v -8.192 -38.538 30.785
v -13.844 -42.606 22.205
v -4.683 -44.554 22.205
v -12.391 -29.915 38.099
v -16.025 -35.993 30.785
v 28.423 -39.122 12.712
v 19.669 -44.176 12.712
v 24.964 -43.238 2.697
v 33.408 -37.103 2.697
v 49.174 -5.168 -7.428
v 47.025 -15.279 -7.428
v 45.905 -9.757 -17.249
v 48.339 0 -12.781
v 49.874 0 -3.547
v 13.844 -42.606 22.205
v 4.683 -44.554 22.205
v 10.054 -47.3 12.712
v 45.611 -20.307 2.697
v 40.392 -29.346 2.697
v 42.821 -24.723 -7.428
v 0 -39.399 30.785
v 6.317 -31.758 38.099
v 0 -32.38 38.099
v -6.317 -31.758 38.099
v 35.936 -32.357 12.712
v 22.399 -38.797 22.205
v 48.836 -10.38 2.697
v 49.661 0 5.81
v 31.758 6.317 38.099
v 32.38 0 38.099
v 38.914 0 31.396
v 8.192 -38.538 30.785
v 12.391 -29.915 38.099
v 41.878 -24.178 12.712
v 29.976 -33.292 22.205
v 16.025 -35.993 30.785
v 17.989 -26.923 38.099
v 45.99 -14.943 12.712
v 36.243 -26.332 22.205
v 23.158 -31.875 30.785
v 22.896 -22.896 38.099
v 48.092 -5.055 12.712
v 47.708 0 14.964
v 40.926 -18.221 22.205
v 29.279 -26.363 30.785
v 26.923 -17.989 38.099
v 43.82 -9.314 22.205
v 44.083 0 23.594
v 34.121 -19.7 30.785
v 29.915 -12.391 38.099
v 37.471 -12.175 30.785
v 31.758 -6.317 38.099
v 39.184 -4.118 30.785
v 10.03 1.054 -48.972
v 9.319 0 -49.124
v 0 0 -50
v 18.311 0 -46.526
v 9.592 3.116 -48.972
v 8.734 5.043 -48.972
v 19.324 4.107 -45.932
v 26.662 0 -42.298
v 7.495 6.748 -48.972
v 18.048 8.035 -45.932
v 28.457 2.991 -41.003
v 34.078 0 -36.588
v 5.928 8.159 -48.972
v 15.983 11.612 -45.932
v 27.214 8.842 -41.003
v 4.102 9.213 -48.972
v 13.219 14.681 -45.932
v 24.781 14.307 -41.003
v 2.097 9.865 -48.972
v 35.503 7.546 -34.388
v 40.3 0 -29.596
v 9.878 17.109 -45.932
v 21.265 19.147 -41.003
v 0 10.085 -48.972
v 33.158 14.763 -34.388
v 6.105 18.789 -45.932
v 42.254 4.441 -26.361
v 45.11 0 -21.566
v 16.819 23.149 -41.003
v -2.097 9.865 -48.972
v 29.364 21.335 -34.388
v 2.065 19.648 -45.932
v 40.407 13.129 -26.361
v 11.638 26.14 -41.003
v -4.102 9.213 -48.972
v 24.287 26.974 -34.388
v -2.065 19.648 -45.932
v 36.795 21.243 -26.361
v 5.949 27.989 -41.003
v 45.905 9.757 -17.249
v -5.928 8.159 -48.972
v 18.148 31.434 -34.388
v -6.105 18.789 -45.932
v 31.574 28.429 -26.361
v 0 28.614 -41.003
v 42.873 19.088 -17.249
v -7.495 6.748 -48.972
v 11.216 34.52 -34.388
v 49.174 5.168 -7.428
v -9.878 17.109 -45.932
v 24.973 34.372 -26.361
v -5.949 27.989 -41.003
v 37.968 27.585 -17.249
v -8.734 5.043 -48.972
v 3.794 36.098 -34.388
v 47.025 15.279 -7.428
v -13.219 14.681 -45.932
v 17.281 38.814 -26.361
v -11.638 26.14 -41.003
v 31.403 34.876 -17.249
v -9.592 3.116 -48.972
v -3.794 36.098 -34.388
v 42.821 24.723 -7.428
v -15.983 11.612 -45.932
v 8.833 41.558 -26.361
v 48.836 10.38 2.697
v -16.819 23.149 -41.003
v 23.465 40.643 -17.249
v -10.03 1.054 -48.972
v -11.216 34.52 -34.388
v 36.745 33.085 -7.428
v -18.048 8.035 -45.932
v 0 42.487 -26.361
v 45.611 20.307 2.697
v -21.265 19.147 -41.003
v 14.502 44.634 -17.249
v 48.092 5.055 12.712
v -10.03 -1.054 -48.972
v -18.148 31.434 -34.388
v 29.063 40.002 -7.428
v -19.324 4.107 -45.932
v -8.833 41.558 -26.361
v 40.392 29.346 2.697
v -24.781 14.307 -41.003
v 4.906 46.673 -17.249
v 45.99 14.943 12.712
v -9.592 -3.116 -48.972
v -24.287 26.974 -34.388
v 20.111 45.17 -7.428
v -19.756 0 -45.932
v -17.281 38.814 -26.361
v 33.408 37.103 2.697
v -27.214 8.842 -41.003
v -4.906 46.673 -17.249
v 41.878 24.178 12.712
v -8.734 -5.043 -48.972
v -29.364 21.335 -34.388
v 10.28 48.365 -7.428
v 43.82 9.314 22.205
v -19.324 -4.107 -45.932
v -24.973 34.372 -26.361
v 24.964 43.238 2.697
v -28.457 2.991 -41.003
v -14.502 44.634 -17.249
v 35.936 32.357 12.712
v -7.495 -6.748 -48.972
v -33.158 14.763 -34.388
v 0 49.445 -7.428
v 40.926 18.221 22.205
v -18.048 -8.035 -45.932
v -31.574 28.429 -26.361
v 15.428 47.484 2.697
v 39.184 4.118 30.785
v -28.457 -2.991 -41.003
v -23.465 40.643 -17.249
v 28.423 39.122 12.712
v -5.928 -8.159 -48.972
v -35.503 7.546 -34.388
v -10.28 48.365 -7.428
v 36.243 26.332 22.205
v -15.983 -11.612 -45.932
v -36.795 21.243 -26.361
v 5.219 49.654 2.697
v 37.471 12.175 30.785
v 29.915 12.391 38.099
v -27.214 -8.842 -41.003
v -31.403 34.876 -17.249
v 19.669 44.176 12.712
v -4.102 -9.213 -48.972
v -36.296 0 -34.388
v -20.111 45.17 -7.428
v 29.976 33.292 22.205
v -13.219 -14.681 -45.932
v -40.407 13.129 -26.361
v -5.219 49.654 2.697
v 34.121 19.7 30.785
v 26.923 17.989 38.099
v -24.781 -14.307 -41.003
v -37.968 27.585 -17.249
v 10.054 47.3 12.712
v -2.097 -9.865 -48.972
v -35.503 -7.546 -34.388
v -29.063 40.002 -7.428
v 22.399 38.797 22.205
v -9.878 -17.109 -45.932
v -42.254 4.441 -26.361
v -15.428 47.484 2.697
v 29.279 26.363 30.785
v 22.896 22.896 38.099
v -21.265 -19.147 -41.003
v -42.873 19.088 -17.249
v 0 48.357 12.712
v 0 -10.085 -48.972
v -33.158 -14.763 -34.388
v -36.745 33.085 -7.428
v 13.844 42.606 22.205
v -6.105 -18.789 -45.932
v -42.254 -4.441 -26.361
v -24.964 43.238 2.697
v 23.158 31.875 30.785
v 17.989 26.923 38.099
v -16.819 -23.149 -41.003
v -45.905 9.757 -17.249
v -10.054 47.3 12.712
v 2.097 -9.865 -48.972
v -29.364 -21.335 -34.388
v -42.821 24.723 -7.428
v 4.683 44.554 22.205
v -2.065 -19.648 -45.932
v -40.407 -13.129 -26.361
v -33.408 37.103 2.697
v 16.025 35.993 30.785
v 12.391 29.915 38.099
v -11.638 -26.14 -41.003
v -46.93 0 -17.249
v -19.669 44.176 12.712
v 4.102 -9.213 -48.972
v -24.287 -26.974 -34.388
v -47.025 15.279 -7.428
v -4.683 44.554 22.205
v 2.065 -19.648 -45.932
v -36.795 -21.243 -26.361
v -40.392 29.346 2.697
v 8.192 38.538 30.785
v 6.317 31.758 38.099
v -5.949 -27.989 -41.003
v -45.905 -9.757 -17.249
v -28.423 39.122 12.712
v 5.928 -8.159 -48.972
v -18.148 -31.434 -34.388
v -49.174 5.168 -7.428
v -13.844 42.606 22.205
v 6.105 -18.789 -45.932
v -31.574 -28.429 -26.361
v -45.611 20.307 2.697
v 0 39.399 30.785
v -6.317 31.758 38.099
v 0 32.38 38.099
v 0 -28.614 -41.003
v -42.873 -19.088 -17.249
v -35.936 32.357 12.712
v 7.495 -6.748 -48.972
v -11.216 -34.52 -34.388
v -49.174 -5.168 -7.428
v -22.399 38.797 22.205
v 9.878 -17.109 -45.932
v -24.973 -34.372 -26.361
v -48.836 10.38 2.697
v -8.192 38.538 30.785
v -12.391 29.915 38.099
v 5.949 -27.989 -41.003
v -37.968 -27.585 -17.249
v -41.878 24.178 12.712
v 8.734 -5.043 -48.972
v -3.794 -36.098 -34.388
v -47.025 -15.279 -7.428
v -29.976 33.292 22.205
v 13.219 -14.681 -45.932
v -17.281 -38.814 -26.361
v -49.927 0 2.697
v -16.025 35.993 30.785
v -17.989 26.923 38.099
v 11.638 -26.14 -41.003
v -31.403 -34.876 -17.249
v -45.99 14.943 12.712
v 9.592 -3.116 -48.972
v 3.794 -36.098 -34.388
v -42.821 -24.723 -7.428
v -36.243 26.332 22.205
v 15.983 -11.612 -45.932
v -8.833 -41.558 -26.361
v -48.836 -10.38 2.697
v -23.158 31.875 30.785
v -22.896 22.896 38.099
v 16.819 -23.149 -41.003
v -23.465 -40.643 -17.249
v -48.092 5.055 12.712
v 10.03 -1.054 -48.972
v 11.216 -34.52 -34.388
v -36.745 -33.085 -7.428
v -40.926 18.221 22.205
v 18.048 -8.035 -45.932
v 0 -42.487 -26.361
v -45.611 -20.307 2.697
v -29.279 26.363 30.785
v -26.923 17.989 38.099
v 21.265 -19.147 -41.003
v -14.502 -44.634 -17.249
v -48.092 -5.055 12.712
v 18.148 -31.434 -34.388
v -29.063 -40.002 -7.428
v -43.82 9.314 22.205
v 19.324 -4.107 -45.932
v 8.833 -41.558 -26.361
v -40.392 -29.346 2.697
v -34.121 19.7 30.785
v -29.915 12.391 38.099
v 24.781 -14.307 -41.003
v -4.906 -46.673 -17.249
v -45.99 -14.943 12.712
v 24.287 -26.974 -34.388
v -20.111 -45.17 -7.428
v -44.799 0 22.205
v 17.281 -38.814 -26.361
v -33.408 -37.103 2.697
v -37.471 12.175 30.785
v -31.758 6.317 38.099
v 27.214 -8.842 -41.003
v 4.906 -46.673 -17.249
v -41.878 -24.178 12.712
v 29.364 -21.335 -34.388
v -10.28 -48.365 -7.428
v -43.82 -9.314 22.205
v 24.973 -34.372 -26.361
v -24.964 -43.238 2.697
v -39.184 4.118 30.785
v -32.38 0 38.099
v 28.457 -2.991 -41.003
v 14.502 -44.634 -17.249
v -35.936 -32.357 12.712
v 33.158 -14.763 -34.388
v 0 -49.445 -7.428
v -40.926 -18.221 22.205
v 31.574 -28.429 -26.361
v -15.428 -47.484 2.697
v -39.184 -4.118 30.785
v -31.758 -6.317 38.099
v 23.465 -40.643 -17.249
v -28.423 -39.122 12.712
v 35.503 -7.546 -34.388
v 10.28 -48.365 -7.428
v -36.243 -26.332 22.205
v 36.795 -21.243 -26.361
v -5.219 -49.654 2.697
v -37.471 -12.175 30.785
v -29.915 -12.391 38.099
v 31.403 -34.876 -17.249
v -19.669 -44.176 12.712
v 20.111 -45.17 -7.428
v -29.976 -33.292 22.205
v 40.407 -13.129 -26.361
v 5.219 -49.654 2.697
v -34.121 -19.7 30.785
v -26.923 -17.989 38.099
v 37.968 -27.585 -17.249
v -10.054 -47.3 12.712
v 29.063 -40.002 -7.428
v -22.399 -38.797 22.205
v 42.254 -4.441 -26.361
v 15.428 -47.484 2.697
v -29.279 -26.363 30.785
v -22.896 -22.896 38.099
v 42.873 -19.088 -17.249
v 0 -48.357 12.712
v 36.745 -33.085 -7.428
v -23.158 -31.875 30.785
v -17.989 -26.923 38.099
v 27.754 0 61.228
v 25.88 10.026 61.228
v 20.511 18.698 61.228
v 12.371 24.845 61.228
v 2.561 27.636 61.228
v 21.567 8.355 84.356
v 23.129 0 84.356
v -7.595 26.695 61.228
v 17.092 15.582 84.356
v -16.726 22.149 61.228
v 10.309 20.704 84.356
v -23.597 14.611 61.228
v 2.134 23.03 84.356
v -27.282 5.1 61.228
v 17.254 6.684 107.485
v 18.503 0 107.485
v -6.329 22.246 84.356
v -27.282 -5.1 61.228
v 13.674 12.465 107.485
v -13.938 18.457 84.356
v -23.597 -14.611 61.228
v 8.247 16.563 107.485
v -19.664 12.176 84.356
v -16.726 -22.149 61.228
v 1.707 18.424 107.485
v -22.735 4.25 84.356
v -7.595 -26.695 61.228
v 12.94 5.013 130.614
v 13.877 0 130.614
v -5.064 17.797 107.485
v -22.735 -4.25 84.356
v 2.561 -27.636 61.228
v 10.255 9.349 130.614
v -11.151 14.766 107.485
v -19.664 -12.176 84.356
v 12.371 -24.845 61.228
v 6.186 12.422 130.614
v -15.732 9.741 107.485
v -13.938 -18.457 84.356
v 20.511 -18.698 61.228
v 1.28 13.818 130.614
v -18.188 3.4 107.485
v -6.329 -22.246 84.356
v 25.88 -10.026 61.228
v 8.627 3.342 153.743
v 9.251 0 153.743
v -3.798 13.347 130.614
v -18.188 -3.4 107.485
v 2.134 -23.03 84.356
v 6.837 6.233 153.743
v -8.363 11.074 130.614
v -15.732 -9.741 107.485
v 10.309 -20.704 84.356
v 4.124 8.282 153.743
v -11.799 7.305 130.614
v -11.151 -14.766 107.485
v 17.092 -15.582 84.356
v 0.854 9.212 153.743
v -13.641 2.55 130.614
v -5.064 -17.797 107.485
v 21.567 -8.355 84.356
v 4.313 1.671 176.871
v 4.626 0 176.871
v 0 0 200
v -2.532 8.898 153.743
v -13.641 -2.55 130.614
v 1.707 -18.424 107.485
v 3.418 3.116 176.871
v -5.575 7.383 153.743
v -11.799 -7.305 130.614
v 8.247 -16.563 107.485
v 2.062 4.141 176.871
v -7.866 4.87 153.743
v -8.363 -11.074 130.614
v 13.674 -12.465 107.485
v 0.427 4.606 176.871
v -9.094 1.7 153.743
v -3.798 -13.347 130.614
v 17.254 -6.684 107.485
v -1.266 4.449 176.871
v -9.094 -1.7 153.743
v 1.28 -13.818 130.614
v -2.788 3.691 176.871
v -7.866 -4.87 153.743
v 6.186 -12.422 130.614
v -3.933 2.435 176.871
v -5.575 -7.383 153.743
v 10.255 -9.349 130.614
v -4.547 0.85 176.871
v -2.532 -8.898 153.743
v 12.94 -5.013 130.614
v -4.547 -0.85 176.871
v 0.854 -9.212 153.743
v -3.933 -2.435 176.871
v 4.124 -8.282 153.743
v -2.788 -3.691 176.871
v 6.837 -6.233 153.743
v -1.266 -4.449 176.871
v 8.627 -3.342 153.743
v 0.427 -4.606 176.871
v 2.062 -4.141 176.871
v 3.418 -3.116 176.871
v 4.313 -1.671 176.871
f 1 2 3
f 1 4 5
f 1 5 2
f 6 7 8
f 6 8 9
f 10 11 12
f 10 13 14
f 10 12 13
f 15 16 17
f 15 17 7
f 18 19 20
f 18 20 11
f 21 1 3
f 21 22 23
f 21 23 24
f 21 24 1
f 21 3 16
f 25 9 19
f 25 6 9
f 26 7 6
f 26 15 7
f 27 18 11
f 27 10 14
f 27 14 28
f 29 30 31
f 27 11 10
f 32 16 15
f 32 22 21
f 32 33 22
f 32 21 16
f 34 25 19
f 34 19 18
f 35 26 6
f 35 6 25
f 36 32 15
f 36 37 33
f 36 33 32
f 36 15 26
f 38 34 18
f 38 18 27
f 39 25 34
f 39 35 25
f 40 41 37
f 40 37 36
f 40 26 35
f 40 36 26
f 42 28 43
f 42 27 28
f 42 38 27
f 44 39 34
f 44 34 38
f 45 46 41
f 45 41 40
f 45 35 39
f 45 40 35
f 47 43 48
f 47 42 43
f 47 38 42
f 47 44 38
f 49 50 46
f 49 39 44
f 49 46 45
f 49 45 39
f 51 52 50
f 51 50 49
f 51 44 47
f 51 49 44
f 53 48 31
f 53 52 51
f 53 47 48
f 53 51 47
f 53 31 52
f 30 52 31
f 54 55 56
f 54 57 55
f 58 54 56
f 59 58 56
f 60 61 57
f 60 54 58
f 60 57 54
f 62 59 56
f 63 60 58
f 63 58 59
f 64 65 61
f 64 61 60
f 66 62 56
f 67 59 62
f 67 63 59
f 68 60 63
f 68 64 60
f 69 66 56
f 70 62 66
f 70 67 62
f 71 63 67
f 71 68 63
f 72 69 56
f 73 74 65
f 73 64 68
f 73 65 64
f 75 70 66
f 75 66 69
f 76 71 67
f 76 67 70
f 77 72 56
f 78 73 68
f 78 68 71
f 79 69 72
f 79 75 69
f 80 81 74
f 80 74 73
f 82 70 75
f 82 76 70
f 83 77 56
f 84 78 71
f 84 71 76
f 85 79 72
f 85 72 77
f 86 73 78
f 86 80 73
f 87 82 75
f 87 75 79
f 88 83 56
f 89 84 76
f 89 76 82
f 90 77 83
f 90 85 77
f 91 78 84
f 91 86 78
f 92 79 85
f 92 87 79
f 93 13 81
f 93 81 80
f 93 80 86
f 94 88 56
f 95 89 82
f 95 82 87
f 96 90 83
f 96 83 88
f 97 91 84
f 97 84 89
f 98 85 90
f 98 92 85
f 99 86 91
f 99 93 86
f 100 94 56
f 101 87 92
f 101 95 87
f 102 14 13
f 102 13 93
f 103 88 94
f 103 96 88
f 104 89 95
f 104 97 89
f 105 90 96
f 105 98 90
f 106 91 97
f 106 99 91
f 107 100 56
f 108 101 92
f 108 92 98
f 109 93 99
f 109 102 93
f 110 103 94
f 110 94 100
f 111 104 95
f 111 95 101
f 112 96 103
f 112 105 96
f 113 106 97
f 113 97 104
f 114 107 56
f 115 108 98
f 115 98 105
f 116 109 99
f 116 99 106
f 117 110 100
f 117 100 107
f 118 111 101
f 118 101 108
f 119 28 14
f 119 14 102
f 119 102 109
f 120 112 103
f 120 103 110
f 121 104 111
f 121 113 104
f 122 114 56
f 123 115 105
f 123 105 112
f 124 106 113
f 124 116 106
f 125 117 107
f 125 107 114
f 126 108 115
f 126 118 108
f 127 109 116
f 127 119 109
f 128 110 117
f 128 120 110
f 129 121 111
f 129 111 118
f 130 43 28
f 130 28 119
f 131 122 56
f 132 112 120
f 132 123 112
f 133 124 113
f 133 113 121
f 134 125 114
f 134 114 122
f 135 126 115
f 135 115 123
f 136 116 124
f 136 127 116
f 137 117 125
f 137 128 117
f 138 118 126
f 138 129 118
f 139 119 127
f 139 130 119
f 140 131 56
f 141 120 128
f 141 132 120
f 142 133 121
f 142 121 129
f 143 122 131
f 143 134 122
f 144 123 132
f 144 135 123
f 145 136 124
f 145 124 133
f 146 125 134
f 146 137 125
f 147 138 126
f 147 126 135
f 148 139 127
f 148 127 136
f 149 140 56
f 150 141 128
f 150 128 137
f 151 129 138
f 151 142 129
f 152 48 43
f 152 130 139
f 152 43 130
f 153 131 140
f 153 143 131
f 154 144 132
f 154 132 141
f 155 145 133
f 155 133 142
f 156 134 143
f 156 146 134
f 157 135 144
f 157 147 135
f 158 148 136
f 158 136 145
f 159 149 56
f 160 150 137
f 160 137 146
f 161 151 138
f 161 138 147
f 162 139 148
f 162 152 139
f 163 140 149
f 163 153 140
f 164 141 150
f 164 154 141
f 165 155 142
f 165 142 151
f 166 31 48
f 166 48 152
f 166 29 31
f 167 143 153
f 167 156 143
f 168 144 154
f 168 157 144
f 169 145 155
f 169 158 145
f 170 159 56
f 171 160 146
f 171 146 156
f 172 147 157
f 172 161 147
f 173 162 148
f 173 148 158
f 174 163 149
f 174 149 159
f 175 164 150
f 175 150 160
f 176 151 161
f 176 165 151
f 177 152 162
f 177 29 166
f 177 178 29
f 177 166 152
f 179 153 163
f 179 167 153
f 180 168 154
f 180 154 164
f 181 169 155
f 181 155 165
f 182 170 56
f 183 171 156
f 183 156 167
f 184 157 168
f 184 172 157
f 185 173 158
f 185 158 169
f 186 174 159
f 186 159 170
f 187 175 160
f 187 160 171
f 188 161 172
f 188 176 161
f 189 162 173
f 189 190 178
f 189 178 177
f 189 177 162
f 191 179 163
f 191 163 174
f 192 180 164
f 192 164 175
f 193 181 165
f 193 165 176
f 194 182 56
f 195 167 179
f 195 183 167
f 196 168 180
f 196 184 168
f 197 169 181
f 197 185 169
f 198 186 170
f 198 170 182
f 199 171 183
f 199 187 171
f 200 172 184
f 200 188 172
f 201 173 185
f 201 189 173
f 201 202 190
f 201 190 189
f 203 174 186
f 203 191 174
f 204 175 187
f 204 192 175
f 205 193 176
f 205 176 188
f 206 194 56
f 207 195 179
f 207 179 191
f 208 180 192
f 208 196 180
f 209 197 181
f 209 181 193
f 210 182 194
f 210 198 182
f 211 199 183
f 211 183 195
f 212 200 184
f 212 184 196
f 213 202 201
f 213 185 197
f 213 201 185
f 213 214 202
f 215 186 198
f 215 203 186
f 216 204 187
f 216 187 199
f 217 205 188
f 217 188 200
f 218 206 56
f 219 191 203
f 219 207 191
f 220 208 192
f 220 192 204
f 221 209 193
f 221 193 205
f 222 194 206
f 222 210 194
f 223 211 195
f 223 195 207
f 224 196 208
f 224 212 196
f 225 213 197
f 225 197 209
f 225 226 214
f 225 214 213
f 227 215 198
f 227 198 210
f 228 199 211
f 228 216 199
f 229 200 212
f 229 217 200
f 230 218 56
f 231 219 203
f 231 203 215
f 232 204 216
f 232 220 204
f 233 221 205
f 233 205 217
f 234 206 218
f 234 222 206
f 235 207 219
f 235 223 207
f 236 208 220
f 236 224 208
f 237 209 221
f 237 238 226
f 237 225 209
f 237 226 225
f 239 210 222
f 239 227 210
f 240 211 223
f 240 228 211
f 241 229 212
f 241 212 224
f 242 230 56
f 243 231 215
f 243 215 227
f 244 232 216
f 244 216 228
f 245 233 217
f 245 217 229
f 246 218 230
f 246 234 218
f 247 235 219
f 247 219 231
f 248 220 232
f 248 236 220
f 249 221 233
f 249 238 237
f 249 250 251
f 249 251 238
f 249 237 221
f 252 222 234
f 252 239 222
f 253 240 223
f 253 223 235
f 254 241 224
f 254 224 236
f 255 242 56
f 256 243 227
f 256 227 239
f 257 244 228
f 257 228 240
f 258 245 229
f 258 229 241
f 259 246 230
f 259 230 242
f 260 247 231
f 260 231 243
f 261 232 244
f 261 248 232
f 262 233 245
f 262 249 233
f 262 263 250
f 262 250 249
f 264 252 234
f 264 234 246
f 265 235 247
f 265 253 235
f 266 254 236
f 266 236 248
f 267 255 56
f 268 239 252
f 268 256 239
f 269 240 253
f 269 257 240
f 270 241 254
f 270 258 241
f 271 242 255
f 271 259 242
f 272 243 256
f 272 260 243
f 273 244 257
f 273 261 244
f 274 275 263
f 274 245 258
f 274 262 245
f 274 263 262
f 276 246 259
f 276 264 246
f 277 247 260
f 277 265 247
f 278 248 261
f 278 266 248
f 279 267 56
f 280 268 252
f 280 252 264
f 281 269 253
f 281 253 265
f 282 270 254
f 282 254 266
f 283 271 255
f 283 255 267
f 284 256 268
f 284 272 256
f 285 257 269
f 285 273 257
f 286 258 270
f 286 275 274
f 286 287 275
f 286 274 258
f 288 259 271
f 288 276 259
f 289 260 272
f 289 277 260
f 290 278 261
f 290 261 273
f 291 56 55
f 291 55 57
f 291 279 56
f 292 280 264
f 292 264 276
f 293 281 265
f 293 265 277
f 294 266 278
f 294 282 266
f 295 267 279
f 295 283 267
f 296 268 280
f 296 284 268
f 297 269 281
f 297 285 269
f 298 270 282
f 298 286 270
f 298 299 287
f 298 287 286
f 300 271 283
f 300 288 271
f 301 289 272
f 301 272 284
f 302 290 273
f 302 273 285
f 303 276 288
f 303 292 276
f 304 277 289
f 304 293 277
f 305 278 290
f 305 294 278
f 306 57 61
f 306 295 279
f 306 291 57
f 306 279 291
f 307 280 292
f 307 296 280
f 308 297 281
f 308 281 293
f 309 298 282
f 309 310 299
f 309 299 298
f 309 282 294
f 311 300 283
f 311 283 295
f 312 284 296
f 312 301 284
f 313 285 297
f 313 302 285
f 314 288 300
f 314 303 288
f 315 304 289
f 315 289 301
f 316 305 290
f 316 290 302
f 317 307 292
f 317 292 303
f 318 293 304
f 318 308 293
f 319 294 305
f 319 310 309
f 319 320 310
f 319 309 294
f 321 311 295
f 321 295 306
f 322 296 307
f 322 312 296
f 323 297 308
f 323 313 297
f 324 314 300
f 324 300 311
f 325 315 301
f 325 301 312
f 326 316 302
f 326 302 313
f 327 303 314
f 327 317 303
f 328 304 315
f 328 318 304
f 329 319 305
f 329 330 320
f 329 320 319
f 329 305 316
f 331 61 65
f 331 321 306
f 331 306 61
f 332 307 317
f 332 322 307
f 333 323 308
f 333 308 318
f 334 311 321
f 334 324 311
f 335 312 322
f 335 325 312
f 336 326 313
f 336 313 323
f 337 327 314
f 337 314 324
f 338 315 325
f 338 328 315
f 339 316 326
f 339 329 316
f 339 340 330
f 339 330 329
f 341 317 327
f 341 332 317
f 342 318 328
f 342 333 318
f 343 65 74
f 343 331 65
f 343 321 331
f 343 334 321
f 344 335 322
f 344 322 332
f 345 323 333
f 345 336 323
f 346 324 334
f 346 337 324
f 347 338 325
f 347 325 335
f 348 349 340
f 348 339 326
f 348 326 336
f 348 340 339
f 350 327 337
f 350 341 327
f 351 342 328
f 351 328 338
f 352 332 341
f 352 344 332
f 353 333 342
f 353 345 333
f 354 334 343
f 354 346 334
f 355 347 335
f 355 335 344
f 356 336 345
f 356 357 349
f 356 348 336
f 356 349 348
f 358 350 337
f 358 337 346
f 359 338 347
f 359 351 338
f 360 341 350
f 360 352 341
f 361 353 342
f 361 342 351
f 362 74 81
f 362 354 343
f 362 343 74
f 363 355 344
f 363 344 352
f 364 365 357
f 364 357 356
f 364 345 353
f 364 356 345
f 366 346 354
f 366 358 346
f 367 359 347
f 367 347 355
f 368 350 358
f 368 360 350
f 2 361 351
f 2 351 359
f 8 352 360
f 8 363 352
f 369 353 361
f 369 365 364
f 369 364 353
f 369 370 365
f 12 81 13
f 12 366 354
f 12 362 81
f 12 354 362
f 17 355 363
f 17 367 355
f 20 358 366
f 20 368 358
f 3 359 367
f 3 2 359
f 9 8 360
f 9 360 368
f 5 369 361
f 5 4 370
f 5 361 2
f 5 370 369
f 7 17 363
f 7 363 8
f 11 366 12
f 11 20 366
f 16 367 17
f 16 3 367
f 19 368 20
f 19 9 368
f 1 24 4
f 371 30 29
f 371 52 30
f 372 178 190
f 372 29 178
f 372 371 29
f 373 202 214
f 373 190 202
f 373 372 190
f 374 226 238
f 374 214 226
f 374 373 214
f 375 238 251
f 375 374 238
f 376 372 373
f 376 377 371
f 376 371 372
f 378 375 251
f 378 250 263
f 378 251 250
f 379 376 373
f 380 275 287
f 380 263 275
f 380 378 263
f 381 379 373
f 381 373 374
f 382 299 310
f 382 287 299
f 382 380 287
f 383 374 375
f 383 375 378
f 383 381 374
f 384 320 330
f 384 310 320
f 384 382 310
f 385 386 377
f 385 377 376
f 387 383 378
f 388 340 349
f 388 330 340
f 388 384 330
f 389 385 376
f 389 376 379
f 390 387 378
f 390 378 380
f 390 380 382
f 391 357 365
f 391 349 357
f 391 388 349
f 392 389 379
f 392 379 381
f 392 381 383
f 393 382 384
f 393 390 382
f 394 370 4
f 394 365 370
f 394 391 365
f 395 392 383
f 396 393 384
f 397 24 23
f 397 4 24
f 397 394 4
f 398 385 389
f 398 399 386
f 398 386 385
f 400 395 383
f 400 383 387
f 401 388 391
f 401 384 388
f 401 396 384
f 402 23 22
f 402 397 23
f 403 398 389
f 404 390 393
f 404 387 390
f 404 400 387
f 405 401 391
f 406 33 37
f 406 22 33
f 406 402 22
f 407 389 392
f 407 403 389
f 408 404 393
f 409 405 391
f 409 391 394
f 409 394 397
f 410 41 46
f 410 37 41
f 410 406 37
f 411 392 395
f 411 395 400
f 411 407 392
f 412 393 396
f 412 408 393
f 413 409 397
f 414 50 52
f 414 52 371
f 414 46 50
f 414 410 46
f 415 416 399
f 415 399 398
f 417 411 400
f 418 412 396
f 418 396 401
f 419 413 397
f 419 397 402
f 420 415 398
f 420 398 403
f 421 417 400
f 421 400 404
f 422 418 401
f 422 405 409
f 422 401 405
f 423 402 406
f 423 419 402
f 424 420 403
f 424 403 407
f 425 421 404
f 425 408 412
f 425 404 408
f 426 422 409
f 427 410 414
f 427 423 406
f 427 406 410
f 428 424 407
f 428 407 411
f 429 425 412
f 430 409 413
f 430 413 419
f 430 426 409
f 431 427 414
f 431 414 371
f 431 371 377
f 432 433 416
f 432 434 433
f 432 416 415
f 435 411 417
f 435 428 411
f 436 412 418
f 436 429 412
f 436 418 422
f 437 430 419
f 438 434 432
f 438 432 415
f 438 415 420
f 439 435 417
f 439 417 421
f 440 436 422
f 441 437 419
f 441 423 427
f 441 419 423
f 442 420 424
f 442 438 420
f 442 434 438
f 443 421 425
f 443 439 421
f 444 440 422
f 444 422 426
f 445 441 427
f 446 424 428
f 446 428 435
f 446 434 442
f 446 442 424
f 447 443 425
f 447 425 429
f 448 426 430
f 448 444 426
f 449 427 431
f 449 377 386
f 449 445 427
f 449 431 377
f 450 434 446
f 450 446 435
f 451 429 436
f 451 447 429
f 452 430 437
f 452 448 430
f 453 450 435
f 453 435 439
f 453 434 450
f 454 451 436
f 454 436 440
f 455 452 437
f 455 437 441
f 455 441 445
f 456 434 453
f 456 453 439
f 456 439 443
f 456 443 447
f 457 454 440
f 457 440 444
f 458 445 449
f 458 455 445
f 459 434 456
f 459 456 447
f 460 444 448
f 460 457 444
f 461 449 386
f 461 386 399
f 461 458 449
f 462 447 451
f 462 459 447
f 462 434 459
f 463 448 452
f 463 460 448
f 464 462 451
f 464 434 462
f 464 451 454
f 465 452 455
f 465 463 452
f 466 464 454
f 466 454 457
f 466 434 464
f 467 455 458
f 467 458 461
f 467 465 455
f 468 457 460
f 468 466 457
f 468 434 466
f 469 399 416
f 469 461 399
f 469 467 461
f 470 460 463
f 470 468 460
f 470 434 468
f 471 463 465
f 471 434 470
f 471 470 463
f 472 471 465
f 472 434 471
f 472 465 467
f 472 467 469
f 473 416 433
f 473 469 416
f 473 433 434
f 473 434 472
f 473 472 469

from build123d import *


with BuildPart() as cone:
    # Cone → Cone (revolve)
    with BuildSketch(Plane.XZ):
        Polygon((0, 0), (40, 0), (0, 200), align=None)
    revolve(axis=Axis((0, 0, 0), (0, 0, 1)))


with BuildPart() as fusion:
    # Sphere001 → Sphere001 (revolve)
    with BuildSketch(Plane.XZ):
        with BuildLine():
            ThreePointArc((0, -50), (50, 0), (0, 50))
            Line((0, 50), (0, -50))
        make_face()
    revolve(axis=Axis((0, 0, 0), (0, 0, 1)))

    # Fusion: union Cone
    add(cone.part)


solid = fusion.part
